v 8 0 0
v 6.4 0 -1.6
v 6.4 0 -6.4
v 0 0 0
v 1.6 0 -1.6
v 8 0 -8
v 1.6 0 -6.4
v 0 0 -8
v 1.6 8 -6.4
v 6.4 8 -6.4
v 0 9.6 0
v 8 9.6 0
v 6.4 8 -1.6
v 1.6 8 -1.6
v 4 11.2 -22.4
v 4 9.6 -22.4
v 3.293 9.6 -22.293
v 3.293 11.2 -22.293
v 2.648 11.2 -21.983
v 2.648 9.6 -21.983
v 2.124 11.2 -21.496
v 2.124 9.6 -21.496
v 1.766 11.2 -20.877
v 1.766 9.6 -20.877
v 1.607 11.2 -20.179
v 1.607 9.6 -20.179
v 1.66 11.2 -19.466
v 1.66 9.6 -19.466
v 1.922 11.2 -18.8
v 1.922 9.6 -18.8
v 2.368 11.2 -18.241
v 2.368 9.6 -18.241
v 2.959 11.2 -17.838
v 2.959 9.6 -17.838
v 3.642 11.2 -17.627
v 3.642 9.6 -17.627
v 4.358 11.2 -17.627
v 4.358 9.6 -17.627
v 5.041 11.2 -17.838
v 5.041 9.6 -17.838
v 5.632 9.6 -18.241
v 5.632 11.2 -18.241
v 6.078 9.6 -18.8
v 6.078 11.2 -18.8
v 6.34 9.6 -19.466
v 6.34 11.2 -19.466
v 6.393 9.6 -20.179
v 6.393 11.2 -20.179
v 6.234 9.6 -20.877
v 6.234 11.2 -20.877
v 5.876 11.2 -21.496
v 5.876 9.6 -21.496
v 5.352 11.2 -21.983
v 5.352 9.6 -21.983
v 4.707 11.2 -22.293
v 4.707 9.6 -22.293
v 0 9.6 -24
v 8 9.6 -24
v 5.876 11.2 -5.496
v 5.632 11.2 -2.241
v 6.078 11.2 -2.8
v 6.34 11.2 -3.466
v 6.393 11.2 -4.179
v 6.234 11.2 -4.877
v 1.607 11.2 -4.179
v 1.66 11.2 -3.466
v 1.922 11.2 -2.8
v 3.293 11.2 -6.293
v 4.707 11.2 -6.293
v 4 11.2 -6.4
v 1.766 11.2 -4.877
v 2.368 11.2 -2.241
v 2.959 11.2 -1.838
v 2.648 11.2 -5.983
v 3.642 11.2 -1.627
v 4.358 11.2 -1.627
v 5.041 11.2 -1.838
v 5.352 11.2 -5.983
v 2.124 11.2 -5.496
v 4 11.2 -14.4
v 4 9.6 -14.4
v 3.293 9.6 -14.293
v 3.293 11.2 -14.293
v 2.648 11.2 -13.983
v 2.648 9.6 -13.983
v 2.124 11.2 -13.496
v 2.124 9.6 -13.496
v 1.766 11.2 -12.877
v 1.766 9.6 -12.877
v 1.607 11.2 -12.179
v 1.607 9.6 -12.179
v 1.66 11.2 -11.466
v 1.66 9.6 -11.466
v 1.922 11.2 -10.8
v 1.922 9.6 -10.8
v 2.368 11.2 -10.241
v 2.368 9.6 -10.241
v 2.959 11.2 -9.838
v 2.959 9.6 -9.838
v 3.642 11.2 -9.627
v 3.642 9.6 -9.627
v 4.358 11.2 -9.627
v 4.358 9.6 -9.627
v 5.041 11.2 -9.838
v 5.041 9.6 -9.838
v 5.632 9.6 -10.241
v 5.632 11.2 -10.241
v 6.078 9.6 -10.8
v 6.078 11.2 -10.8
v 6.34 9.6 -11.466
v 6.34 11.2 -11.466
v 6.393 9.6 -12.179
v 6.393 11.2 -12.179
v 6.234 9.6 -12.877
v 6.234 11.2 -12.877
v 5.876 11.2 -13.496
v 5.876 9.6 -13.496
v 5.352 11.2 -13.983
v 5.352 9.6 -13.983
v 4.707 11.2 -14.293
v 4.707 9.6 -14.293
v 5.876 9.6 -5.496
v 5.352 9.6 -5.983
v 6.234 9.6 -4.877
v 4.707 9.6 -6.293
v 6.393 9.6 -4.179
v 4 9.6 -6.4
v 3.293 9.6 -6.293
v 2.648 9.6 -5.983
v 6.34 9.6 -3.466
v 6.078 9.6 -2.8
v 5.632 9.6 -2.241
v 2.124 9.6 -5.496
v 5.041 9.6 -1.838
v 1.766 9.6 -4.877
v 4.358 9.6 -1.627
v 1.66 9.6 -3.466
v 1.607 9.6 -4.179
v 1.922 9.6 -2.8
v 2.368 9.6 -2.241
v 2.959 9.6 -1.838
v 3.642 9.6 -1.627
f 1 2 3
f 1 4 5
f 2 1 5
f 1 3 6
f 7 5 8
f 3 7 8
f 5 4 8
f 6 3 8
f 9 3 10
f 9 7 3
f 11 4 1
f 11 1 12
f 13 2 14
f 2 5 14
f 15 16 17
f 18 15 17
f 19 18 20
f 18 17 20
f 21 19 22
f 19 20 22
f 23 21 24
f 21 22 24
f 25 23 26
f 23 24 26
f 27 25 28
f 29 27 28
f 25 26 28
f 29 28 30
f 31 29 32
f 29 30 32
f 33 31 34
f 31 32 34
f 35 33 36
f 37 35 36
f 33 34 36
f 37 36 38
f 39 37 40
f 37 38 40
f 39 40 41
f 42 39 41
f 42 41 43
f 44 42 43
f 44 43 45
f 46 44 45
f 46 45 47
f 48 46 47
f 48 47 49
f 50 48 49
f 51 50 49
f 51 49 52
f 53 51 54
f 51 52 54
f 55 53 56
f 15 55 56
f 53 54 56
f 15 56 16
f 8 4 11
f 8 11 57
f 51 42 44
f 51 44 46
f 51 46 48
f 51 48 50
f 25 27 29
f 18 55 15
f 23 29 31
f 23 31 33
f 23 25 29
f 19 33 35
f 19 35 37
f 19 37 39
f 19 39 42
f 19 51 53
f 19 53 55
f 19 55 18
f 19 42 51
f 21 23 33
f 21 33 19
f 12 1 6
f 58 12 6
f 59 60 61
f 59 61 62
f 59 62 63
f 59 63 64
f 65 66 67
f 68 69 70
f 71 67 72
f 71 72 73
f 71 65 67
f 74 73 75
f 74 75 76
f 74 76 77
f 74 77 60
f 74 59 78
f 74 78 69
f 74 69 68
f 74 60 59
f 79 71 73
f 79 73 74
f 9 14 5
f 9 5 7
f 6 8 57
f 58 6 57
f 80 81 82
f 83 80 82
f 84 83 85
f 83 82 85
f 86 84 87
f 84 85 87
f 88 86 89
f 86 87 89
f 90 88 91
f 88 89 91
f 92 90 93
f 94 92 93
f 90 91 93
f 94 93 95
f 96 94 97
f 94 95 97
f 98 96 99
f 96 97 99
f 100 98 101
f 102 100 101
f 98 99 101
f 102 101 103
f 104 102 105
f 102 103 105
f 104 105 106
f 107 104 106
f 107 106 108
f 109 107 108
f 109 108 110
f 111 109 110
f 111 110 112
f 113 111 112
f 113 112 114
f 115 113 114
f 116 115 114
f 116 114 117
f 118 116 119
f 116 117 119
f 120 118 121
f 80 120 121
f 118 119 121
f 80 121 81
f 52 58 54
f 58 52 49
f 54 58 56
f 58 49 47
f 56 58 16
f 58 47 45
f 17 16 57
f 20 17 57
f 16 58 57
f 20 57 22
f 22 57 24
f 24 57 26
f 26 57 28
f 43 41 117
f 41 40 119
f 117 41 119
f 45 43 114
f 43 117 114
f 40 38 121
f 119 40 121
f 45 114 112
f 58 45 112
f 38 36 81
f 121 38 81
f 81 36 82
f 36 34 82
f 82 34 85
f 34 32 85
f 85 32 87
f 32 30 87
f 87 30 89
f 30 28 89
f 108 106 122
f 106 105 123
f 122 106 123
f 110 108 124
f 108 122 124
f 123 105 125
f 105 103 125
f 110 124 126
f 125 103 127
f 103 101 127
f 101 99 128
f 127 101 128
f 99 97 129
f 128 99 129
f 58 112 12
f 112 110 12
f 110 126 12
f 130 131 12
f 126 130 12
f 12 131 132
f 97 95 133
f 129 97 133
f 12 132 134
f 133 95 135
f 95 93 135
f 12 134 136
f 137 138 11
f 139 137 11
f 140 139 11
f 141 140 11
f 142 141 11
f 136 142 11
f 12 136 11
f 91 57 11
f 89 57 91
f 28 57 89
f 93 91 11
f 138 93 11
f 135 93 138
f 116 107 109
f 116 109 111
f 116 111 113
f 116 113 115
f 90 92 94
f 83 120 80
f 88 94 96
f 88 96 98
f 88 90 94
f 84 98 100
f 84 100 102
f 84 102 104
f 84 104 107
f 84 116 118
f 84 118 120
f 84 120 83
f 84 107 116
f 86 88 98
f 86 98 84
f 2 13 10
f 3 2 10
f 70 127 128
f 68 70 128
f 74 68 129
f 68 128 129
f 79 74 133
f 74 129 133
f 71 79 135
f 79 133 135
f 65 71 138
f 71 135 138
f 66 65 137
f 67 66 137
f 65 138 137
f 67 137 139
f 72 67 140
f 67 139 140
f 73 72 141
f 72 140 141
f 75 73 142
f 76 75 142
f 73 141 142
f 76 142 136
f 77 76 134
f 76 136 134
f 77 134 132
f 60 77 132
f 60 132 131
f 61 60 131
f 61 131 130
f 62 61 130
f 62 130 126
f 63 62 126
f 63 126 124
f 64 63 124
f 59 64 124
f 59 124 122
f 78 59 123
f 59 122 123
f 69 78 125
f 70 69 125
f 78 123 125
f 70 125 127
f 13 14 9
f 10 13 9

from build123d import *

# Parameters (mm, degrees)
SKETCH1_W           = 8
SKETCH1_H           = 9.6
BOSS_EXTRUDE1_DEPTH = 8
SHELL2_T            = -1.6
BOSS_EXTRUDE3_DEPTH = 8
SKETCH4_R           = 2.4
BOSS_EXTRUDE4_DEPTH = 1.6
LPATTERN2_COUNT     = 3
LPATTERN2_PITCH     = 8


with BuildPart() as part:
    # Sketch1 → Boss-Extrude1 (new body)
    with BuildSketch(Plane(origin=(0, 0, 0), x_dir=(0, 0, -1), z_dir=(1, 0, 0))):
        with Locations((4, 4.8)):
            Rectangle(SKETCH1_W, SKETCH1_H)
    extrude(amount=BOSS_EXTRUDE1_DEPTH)

    # Shell2
    shell2_openings = [part.faces().sort_by_distance(p)[0] for p in [
        (4, 0, -4),
    ]]
    offset(amount=SHELL2_T, openings=shell2_openings, kind=Kind.INTERSECTION)

    # Sketch3 → Boss-Extrude3 (add)
    with BuildSketch(Plane(origin=(0, 0, 0), x_dir=(0, 0, -1), z_dir=(1, 0, 0))):
        Polygon((8, 0), (24, 9.6), (8, 9.6), align=None)
    extrude(amount=BOSS_EXTRUDE3_DEPTH)

    # Sketch4 → Boss-Extrude4 (add)
    with BuildSketch(Plane(origin=(0, 9.6, 0), x_dir=(1, 0, 0), z_dir=(0, 1, 0))):
        with Locations(Location((4, 4, 0), (0, 0, 90))):
            Circle(SKETCH4_R)
    boss_extrude4 = extrude(amount=BOSS_EXTRUDE4_DEPTH)

    # LPattern2: Boss-Extrude4 ×3
    with Locations(*[(0, 0, -i * LPATTERN2_PITCH) for i in range(1, LPATTERN2_COUNT)]):
        add(boss_extrude4)


solid = part.part
